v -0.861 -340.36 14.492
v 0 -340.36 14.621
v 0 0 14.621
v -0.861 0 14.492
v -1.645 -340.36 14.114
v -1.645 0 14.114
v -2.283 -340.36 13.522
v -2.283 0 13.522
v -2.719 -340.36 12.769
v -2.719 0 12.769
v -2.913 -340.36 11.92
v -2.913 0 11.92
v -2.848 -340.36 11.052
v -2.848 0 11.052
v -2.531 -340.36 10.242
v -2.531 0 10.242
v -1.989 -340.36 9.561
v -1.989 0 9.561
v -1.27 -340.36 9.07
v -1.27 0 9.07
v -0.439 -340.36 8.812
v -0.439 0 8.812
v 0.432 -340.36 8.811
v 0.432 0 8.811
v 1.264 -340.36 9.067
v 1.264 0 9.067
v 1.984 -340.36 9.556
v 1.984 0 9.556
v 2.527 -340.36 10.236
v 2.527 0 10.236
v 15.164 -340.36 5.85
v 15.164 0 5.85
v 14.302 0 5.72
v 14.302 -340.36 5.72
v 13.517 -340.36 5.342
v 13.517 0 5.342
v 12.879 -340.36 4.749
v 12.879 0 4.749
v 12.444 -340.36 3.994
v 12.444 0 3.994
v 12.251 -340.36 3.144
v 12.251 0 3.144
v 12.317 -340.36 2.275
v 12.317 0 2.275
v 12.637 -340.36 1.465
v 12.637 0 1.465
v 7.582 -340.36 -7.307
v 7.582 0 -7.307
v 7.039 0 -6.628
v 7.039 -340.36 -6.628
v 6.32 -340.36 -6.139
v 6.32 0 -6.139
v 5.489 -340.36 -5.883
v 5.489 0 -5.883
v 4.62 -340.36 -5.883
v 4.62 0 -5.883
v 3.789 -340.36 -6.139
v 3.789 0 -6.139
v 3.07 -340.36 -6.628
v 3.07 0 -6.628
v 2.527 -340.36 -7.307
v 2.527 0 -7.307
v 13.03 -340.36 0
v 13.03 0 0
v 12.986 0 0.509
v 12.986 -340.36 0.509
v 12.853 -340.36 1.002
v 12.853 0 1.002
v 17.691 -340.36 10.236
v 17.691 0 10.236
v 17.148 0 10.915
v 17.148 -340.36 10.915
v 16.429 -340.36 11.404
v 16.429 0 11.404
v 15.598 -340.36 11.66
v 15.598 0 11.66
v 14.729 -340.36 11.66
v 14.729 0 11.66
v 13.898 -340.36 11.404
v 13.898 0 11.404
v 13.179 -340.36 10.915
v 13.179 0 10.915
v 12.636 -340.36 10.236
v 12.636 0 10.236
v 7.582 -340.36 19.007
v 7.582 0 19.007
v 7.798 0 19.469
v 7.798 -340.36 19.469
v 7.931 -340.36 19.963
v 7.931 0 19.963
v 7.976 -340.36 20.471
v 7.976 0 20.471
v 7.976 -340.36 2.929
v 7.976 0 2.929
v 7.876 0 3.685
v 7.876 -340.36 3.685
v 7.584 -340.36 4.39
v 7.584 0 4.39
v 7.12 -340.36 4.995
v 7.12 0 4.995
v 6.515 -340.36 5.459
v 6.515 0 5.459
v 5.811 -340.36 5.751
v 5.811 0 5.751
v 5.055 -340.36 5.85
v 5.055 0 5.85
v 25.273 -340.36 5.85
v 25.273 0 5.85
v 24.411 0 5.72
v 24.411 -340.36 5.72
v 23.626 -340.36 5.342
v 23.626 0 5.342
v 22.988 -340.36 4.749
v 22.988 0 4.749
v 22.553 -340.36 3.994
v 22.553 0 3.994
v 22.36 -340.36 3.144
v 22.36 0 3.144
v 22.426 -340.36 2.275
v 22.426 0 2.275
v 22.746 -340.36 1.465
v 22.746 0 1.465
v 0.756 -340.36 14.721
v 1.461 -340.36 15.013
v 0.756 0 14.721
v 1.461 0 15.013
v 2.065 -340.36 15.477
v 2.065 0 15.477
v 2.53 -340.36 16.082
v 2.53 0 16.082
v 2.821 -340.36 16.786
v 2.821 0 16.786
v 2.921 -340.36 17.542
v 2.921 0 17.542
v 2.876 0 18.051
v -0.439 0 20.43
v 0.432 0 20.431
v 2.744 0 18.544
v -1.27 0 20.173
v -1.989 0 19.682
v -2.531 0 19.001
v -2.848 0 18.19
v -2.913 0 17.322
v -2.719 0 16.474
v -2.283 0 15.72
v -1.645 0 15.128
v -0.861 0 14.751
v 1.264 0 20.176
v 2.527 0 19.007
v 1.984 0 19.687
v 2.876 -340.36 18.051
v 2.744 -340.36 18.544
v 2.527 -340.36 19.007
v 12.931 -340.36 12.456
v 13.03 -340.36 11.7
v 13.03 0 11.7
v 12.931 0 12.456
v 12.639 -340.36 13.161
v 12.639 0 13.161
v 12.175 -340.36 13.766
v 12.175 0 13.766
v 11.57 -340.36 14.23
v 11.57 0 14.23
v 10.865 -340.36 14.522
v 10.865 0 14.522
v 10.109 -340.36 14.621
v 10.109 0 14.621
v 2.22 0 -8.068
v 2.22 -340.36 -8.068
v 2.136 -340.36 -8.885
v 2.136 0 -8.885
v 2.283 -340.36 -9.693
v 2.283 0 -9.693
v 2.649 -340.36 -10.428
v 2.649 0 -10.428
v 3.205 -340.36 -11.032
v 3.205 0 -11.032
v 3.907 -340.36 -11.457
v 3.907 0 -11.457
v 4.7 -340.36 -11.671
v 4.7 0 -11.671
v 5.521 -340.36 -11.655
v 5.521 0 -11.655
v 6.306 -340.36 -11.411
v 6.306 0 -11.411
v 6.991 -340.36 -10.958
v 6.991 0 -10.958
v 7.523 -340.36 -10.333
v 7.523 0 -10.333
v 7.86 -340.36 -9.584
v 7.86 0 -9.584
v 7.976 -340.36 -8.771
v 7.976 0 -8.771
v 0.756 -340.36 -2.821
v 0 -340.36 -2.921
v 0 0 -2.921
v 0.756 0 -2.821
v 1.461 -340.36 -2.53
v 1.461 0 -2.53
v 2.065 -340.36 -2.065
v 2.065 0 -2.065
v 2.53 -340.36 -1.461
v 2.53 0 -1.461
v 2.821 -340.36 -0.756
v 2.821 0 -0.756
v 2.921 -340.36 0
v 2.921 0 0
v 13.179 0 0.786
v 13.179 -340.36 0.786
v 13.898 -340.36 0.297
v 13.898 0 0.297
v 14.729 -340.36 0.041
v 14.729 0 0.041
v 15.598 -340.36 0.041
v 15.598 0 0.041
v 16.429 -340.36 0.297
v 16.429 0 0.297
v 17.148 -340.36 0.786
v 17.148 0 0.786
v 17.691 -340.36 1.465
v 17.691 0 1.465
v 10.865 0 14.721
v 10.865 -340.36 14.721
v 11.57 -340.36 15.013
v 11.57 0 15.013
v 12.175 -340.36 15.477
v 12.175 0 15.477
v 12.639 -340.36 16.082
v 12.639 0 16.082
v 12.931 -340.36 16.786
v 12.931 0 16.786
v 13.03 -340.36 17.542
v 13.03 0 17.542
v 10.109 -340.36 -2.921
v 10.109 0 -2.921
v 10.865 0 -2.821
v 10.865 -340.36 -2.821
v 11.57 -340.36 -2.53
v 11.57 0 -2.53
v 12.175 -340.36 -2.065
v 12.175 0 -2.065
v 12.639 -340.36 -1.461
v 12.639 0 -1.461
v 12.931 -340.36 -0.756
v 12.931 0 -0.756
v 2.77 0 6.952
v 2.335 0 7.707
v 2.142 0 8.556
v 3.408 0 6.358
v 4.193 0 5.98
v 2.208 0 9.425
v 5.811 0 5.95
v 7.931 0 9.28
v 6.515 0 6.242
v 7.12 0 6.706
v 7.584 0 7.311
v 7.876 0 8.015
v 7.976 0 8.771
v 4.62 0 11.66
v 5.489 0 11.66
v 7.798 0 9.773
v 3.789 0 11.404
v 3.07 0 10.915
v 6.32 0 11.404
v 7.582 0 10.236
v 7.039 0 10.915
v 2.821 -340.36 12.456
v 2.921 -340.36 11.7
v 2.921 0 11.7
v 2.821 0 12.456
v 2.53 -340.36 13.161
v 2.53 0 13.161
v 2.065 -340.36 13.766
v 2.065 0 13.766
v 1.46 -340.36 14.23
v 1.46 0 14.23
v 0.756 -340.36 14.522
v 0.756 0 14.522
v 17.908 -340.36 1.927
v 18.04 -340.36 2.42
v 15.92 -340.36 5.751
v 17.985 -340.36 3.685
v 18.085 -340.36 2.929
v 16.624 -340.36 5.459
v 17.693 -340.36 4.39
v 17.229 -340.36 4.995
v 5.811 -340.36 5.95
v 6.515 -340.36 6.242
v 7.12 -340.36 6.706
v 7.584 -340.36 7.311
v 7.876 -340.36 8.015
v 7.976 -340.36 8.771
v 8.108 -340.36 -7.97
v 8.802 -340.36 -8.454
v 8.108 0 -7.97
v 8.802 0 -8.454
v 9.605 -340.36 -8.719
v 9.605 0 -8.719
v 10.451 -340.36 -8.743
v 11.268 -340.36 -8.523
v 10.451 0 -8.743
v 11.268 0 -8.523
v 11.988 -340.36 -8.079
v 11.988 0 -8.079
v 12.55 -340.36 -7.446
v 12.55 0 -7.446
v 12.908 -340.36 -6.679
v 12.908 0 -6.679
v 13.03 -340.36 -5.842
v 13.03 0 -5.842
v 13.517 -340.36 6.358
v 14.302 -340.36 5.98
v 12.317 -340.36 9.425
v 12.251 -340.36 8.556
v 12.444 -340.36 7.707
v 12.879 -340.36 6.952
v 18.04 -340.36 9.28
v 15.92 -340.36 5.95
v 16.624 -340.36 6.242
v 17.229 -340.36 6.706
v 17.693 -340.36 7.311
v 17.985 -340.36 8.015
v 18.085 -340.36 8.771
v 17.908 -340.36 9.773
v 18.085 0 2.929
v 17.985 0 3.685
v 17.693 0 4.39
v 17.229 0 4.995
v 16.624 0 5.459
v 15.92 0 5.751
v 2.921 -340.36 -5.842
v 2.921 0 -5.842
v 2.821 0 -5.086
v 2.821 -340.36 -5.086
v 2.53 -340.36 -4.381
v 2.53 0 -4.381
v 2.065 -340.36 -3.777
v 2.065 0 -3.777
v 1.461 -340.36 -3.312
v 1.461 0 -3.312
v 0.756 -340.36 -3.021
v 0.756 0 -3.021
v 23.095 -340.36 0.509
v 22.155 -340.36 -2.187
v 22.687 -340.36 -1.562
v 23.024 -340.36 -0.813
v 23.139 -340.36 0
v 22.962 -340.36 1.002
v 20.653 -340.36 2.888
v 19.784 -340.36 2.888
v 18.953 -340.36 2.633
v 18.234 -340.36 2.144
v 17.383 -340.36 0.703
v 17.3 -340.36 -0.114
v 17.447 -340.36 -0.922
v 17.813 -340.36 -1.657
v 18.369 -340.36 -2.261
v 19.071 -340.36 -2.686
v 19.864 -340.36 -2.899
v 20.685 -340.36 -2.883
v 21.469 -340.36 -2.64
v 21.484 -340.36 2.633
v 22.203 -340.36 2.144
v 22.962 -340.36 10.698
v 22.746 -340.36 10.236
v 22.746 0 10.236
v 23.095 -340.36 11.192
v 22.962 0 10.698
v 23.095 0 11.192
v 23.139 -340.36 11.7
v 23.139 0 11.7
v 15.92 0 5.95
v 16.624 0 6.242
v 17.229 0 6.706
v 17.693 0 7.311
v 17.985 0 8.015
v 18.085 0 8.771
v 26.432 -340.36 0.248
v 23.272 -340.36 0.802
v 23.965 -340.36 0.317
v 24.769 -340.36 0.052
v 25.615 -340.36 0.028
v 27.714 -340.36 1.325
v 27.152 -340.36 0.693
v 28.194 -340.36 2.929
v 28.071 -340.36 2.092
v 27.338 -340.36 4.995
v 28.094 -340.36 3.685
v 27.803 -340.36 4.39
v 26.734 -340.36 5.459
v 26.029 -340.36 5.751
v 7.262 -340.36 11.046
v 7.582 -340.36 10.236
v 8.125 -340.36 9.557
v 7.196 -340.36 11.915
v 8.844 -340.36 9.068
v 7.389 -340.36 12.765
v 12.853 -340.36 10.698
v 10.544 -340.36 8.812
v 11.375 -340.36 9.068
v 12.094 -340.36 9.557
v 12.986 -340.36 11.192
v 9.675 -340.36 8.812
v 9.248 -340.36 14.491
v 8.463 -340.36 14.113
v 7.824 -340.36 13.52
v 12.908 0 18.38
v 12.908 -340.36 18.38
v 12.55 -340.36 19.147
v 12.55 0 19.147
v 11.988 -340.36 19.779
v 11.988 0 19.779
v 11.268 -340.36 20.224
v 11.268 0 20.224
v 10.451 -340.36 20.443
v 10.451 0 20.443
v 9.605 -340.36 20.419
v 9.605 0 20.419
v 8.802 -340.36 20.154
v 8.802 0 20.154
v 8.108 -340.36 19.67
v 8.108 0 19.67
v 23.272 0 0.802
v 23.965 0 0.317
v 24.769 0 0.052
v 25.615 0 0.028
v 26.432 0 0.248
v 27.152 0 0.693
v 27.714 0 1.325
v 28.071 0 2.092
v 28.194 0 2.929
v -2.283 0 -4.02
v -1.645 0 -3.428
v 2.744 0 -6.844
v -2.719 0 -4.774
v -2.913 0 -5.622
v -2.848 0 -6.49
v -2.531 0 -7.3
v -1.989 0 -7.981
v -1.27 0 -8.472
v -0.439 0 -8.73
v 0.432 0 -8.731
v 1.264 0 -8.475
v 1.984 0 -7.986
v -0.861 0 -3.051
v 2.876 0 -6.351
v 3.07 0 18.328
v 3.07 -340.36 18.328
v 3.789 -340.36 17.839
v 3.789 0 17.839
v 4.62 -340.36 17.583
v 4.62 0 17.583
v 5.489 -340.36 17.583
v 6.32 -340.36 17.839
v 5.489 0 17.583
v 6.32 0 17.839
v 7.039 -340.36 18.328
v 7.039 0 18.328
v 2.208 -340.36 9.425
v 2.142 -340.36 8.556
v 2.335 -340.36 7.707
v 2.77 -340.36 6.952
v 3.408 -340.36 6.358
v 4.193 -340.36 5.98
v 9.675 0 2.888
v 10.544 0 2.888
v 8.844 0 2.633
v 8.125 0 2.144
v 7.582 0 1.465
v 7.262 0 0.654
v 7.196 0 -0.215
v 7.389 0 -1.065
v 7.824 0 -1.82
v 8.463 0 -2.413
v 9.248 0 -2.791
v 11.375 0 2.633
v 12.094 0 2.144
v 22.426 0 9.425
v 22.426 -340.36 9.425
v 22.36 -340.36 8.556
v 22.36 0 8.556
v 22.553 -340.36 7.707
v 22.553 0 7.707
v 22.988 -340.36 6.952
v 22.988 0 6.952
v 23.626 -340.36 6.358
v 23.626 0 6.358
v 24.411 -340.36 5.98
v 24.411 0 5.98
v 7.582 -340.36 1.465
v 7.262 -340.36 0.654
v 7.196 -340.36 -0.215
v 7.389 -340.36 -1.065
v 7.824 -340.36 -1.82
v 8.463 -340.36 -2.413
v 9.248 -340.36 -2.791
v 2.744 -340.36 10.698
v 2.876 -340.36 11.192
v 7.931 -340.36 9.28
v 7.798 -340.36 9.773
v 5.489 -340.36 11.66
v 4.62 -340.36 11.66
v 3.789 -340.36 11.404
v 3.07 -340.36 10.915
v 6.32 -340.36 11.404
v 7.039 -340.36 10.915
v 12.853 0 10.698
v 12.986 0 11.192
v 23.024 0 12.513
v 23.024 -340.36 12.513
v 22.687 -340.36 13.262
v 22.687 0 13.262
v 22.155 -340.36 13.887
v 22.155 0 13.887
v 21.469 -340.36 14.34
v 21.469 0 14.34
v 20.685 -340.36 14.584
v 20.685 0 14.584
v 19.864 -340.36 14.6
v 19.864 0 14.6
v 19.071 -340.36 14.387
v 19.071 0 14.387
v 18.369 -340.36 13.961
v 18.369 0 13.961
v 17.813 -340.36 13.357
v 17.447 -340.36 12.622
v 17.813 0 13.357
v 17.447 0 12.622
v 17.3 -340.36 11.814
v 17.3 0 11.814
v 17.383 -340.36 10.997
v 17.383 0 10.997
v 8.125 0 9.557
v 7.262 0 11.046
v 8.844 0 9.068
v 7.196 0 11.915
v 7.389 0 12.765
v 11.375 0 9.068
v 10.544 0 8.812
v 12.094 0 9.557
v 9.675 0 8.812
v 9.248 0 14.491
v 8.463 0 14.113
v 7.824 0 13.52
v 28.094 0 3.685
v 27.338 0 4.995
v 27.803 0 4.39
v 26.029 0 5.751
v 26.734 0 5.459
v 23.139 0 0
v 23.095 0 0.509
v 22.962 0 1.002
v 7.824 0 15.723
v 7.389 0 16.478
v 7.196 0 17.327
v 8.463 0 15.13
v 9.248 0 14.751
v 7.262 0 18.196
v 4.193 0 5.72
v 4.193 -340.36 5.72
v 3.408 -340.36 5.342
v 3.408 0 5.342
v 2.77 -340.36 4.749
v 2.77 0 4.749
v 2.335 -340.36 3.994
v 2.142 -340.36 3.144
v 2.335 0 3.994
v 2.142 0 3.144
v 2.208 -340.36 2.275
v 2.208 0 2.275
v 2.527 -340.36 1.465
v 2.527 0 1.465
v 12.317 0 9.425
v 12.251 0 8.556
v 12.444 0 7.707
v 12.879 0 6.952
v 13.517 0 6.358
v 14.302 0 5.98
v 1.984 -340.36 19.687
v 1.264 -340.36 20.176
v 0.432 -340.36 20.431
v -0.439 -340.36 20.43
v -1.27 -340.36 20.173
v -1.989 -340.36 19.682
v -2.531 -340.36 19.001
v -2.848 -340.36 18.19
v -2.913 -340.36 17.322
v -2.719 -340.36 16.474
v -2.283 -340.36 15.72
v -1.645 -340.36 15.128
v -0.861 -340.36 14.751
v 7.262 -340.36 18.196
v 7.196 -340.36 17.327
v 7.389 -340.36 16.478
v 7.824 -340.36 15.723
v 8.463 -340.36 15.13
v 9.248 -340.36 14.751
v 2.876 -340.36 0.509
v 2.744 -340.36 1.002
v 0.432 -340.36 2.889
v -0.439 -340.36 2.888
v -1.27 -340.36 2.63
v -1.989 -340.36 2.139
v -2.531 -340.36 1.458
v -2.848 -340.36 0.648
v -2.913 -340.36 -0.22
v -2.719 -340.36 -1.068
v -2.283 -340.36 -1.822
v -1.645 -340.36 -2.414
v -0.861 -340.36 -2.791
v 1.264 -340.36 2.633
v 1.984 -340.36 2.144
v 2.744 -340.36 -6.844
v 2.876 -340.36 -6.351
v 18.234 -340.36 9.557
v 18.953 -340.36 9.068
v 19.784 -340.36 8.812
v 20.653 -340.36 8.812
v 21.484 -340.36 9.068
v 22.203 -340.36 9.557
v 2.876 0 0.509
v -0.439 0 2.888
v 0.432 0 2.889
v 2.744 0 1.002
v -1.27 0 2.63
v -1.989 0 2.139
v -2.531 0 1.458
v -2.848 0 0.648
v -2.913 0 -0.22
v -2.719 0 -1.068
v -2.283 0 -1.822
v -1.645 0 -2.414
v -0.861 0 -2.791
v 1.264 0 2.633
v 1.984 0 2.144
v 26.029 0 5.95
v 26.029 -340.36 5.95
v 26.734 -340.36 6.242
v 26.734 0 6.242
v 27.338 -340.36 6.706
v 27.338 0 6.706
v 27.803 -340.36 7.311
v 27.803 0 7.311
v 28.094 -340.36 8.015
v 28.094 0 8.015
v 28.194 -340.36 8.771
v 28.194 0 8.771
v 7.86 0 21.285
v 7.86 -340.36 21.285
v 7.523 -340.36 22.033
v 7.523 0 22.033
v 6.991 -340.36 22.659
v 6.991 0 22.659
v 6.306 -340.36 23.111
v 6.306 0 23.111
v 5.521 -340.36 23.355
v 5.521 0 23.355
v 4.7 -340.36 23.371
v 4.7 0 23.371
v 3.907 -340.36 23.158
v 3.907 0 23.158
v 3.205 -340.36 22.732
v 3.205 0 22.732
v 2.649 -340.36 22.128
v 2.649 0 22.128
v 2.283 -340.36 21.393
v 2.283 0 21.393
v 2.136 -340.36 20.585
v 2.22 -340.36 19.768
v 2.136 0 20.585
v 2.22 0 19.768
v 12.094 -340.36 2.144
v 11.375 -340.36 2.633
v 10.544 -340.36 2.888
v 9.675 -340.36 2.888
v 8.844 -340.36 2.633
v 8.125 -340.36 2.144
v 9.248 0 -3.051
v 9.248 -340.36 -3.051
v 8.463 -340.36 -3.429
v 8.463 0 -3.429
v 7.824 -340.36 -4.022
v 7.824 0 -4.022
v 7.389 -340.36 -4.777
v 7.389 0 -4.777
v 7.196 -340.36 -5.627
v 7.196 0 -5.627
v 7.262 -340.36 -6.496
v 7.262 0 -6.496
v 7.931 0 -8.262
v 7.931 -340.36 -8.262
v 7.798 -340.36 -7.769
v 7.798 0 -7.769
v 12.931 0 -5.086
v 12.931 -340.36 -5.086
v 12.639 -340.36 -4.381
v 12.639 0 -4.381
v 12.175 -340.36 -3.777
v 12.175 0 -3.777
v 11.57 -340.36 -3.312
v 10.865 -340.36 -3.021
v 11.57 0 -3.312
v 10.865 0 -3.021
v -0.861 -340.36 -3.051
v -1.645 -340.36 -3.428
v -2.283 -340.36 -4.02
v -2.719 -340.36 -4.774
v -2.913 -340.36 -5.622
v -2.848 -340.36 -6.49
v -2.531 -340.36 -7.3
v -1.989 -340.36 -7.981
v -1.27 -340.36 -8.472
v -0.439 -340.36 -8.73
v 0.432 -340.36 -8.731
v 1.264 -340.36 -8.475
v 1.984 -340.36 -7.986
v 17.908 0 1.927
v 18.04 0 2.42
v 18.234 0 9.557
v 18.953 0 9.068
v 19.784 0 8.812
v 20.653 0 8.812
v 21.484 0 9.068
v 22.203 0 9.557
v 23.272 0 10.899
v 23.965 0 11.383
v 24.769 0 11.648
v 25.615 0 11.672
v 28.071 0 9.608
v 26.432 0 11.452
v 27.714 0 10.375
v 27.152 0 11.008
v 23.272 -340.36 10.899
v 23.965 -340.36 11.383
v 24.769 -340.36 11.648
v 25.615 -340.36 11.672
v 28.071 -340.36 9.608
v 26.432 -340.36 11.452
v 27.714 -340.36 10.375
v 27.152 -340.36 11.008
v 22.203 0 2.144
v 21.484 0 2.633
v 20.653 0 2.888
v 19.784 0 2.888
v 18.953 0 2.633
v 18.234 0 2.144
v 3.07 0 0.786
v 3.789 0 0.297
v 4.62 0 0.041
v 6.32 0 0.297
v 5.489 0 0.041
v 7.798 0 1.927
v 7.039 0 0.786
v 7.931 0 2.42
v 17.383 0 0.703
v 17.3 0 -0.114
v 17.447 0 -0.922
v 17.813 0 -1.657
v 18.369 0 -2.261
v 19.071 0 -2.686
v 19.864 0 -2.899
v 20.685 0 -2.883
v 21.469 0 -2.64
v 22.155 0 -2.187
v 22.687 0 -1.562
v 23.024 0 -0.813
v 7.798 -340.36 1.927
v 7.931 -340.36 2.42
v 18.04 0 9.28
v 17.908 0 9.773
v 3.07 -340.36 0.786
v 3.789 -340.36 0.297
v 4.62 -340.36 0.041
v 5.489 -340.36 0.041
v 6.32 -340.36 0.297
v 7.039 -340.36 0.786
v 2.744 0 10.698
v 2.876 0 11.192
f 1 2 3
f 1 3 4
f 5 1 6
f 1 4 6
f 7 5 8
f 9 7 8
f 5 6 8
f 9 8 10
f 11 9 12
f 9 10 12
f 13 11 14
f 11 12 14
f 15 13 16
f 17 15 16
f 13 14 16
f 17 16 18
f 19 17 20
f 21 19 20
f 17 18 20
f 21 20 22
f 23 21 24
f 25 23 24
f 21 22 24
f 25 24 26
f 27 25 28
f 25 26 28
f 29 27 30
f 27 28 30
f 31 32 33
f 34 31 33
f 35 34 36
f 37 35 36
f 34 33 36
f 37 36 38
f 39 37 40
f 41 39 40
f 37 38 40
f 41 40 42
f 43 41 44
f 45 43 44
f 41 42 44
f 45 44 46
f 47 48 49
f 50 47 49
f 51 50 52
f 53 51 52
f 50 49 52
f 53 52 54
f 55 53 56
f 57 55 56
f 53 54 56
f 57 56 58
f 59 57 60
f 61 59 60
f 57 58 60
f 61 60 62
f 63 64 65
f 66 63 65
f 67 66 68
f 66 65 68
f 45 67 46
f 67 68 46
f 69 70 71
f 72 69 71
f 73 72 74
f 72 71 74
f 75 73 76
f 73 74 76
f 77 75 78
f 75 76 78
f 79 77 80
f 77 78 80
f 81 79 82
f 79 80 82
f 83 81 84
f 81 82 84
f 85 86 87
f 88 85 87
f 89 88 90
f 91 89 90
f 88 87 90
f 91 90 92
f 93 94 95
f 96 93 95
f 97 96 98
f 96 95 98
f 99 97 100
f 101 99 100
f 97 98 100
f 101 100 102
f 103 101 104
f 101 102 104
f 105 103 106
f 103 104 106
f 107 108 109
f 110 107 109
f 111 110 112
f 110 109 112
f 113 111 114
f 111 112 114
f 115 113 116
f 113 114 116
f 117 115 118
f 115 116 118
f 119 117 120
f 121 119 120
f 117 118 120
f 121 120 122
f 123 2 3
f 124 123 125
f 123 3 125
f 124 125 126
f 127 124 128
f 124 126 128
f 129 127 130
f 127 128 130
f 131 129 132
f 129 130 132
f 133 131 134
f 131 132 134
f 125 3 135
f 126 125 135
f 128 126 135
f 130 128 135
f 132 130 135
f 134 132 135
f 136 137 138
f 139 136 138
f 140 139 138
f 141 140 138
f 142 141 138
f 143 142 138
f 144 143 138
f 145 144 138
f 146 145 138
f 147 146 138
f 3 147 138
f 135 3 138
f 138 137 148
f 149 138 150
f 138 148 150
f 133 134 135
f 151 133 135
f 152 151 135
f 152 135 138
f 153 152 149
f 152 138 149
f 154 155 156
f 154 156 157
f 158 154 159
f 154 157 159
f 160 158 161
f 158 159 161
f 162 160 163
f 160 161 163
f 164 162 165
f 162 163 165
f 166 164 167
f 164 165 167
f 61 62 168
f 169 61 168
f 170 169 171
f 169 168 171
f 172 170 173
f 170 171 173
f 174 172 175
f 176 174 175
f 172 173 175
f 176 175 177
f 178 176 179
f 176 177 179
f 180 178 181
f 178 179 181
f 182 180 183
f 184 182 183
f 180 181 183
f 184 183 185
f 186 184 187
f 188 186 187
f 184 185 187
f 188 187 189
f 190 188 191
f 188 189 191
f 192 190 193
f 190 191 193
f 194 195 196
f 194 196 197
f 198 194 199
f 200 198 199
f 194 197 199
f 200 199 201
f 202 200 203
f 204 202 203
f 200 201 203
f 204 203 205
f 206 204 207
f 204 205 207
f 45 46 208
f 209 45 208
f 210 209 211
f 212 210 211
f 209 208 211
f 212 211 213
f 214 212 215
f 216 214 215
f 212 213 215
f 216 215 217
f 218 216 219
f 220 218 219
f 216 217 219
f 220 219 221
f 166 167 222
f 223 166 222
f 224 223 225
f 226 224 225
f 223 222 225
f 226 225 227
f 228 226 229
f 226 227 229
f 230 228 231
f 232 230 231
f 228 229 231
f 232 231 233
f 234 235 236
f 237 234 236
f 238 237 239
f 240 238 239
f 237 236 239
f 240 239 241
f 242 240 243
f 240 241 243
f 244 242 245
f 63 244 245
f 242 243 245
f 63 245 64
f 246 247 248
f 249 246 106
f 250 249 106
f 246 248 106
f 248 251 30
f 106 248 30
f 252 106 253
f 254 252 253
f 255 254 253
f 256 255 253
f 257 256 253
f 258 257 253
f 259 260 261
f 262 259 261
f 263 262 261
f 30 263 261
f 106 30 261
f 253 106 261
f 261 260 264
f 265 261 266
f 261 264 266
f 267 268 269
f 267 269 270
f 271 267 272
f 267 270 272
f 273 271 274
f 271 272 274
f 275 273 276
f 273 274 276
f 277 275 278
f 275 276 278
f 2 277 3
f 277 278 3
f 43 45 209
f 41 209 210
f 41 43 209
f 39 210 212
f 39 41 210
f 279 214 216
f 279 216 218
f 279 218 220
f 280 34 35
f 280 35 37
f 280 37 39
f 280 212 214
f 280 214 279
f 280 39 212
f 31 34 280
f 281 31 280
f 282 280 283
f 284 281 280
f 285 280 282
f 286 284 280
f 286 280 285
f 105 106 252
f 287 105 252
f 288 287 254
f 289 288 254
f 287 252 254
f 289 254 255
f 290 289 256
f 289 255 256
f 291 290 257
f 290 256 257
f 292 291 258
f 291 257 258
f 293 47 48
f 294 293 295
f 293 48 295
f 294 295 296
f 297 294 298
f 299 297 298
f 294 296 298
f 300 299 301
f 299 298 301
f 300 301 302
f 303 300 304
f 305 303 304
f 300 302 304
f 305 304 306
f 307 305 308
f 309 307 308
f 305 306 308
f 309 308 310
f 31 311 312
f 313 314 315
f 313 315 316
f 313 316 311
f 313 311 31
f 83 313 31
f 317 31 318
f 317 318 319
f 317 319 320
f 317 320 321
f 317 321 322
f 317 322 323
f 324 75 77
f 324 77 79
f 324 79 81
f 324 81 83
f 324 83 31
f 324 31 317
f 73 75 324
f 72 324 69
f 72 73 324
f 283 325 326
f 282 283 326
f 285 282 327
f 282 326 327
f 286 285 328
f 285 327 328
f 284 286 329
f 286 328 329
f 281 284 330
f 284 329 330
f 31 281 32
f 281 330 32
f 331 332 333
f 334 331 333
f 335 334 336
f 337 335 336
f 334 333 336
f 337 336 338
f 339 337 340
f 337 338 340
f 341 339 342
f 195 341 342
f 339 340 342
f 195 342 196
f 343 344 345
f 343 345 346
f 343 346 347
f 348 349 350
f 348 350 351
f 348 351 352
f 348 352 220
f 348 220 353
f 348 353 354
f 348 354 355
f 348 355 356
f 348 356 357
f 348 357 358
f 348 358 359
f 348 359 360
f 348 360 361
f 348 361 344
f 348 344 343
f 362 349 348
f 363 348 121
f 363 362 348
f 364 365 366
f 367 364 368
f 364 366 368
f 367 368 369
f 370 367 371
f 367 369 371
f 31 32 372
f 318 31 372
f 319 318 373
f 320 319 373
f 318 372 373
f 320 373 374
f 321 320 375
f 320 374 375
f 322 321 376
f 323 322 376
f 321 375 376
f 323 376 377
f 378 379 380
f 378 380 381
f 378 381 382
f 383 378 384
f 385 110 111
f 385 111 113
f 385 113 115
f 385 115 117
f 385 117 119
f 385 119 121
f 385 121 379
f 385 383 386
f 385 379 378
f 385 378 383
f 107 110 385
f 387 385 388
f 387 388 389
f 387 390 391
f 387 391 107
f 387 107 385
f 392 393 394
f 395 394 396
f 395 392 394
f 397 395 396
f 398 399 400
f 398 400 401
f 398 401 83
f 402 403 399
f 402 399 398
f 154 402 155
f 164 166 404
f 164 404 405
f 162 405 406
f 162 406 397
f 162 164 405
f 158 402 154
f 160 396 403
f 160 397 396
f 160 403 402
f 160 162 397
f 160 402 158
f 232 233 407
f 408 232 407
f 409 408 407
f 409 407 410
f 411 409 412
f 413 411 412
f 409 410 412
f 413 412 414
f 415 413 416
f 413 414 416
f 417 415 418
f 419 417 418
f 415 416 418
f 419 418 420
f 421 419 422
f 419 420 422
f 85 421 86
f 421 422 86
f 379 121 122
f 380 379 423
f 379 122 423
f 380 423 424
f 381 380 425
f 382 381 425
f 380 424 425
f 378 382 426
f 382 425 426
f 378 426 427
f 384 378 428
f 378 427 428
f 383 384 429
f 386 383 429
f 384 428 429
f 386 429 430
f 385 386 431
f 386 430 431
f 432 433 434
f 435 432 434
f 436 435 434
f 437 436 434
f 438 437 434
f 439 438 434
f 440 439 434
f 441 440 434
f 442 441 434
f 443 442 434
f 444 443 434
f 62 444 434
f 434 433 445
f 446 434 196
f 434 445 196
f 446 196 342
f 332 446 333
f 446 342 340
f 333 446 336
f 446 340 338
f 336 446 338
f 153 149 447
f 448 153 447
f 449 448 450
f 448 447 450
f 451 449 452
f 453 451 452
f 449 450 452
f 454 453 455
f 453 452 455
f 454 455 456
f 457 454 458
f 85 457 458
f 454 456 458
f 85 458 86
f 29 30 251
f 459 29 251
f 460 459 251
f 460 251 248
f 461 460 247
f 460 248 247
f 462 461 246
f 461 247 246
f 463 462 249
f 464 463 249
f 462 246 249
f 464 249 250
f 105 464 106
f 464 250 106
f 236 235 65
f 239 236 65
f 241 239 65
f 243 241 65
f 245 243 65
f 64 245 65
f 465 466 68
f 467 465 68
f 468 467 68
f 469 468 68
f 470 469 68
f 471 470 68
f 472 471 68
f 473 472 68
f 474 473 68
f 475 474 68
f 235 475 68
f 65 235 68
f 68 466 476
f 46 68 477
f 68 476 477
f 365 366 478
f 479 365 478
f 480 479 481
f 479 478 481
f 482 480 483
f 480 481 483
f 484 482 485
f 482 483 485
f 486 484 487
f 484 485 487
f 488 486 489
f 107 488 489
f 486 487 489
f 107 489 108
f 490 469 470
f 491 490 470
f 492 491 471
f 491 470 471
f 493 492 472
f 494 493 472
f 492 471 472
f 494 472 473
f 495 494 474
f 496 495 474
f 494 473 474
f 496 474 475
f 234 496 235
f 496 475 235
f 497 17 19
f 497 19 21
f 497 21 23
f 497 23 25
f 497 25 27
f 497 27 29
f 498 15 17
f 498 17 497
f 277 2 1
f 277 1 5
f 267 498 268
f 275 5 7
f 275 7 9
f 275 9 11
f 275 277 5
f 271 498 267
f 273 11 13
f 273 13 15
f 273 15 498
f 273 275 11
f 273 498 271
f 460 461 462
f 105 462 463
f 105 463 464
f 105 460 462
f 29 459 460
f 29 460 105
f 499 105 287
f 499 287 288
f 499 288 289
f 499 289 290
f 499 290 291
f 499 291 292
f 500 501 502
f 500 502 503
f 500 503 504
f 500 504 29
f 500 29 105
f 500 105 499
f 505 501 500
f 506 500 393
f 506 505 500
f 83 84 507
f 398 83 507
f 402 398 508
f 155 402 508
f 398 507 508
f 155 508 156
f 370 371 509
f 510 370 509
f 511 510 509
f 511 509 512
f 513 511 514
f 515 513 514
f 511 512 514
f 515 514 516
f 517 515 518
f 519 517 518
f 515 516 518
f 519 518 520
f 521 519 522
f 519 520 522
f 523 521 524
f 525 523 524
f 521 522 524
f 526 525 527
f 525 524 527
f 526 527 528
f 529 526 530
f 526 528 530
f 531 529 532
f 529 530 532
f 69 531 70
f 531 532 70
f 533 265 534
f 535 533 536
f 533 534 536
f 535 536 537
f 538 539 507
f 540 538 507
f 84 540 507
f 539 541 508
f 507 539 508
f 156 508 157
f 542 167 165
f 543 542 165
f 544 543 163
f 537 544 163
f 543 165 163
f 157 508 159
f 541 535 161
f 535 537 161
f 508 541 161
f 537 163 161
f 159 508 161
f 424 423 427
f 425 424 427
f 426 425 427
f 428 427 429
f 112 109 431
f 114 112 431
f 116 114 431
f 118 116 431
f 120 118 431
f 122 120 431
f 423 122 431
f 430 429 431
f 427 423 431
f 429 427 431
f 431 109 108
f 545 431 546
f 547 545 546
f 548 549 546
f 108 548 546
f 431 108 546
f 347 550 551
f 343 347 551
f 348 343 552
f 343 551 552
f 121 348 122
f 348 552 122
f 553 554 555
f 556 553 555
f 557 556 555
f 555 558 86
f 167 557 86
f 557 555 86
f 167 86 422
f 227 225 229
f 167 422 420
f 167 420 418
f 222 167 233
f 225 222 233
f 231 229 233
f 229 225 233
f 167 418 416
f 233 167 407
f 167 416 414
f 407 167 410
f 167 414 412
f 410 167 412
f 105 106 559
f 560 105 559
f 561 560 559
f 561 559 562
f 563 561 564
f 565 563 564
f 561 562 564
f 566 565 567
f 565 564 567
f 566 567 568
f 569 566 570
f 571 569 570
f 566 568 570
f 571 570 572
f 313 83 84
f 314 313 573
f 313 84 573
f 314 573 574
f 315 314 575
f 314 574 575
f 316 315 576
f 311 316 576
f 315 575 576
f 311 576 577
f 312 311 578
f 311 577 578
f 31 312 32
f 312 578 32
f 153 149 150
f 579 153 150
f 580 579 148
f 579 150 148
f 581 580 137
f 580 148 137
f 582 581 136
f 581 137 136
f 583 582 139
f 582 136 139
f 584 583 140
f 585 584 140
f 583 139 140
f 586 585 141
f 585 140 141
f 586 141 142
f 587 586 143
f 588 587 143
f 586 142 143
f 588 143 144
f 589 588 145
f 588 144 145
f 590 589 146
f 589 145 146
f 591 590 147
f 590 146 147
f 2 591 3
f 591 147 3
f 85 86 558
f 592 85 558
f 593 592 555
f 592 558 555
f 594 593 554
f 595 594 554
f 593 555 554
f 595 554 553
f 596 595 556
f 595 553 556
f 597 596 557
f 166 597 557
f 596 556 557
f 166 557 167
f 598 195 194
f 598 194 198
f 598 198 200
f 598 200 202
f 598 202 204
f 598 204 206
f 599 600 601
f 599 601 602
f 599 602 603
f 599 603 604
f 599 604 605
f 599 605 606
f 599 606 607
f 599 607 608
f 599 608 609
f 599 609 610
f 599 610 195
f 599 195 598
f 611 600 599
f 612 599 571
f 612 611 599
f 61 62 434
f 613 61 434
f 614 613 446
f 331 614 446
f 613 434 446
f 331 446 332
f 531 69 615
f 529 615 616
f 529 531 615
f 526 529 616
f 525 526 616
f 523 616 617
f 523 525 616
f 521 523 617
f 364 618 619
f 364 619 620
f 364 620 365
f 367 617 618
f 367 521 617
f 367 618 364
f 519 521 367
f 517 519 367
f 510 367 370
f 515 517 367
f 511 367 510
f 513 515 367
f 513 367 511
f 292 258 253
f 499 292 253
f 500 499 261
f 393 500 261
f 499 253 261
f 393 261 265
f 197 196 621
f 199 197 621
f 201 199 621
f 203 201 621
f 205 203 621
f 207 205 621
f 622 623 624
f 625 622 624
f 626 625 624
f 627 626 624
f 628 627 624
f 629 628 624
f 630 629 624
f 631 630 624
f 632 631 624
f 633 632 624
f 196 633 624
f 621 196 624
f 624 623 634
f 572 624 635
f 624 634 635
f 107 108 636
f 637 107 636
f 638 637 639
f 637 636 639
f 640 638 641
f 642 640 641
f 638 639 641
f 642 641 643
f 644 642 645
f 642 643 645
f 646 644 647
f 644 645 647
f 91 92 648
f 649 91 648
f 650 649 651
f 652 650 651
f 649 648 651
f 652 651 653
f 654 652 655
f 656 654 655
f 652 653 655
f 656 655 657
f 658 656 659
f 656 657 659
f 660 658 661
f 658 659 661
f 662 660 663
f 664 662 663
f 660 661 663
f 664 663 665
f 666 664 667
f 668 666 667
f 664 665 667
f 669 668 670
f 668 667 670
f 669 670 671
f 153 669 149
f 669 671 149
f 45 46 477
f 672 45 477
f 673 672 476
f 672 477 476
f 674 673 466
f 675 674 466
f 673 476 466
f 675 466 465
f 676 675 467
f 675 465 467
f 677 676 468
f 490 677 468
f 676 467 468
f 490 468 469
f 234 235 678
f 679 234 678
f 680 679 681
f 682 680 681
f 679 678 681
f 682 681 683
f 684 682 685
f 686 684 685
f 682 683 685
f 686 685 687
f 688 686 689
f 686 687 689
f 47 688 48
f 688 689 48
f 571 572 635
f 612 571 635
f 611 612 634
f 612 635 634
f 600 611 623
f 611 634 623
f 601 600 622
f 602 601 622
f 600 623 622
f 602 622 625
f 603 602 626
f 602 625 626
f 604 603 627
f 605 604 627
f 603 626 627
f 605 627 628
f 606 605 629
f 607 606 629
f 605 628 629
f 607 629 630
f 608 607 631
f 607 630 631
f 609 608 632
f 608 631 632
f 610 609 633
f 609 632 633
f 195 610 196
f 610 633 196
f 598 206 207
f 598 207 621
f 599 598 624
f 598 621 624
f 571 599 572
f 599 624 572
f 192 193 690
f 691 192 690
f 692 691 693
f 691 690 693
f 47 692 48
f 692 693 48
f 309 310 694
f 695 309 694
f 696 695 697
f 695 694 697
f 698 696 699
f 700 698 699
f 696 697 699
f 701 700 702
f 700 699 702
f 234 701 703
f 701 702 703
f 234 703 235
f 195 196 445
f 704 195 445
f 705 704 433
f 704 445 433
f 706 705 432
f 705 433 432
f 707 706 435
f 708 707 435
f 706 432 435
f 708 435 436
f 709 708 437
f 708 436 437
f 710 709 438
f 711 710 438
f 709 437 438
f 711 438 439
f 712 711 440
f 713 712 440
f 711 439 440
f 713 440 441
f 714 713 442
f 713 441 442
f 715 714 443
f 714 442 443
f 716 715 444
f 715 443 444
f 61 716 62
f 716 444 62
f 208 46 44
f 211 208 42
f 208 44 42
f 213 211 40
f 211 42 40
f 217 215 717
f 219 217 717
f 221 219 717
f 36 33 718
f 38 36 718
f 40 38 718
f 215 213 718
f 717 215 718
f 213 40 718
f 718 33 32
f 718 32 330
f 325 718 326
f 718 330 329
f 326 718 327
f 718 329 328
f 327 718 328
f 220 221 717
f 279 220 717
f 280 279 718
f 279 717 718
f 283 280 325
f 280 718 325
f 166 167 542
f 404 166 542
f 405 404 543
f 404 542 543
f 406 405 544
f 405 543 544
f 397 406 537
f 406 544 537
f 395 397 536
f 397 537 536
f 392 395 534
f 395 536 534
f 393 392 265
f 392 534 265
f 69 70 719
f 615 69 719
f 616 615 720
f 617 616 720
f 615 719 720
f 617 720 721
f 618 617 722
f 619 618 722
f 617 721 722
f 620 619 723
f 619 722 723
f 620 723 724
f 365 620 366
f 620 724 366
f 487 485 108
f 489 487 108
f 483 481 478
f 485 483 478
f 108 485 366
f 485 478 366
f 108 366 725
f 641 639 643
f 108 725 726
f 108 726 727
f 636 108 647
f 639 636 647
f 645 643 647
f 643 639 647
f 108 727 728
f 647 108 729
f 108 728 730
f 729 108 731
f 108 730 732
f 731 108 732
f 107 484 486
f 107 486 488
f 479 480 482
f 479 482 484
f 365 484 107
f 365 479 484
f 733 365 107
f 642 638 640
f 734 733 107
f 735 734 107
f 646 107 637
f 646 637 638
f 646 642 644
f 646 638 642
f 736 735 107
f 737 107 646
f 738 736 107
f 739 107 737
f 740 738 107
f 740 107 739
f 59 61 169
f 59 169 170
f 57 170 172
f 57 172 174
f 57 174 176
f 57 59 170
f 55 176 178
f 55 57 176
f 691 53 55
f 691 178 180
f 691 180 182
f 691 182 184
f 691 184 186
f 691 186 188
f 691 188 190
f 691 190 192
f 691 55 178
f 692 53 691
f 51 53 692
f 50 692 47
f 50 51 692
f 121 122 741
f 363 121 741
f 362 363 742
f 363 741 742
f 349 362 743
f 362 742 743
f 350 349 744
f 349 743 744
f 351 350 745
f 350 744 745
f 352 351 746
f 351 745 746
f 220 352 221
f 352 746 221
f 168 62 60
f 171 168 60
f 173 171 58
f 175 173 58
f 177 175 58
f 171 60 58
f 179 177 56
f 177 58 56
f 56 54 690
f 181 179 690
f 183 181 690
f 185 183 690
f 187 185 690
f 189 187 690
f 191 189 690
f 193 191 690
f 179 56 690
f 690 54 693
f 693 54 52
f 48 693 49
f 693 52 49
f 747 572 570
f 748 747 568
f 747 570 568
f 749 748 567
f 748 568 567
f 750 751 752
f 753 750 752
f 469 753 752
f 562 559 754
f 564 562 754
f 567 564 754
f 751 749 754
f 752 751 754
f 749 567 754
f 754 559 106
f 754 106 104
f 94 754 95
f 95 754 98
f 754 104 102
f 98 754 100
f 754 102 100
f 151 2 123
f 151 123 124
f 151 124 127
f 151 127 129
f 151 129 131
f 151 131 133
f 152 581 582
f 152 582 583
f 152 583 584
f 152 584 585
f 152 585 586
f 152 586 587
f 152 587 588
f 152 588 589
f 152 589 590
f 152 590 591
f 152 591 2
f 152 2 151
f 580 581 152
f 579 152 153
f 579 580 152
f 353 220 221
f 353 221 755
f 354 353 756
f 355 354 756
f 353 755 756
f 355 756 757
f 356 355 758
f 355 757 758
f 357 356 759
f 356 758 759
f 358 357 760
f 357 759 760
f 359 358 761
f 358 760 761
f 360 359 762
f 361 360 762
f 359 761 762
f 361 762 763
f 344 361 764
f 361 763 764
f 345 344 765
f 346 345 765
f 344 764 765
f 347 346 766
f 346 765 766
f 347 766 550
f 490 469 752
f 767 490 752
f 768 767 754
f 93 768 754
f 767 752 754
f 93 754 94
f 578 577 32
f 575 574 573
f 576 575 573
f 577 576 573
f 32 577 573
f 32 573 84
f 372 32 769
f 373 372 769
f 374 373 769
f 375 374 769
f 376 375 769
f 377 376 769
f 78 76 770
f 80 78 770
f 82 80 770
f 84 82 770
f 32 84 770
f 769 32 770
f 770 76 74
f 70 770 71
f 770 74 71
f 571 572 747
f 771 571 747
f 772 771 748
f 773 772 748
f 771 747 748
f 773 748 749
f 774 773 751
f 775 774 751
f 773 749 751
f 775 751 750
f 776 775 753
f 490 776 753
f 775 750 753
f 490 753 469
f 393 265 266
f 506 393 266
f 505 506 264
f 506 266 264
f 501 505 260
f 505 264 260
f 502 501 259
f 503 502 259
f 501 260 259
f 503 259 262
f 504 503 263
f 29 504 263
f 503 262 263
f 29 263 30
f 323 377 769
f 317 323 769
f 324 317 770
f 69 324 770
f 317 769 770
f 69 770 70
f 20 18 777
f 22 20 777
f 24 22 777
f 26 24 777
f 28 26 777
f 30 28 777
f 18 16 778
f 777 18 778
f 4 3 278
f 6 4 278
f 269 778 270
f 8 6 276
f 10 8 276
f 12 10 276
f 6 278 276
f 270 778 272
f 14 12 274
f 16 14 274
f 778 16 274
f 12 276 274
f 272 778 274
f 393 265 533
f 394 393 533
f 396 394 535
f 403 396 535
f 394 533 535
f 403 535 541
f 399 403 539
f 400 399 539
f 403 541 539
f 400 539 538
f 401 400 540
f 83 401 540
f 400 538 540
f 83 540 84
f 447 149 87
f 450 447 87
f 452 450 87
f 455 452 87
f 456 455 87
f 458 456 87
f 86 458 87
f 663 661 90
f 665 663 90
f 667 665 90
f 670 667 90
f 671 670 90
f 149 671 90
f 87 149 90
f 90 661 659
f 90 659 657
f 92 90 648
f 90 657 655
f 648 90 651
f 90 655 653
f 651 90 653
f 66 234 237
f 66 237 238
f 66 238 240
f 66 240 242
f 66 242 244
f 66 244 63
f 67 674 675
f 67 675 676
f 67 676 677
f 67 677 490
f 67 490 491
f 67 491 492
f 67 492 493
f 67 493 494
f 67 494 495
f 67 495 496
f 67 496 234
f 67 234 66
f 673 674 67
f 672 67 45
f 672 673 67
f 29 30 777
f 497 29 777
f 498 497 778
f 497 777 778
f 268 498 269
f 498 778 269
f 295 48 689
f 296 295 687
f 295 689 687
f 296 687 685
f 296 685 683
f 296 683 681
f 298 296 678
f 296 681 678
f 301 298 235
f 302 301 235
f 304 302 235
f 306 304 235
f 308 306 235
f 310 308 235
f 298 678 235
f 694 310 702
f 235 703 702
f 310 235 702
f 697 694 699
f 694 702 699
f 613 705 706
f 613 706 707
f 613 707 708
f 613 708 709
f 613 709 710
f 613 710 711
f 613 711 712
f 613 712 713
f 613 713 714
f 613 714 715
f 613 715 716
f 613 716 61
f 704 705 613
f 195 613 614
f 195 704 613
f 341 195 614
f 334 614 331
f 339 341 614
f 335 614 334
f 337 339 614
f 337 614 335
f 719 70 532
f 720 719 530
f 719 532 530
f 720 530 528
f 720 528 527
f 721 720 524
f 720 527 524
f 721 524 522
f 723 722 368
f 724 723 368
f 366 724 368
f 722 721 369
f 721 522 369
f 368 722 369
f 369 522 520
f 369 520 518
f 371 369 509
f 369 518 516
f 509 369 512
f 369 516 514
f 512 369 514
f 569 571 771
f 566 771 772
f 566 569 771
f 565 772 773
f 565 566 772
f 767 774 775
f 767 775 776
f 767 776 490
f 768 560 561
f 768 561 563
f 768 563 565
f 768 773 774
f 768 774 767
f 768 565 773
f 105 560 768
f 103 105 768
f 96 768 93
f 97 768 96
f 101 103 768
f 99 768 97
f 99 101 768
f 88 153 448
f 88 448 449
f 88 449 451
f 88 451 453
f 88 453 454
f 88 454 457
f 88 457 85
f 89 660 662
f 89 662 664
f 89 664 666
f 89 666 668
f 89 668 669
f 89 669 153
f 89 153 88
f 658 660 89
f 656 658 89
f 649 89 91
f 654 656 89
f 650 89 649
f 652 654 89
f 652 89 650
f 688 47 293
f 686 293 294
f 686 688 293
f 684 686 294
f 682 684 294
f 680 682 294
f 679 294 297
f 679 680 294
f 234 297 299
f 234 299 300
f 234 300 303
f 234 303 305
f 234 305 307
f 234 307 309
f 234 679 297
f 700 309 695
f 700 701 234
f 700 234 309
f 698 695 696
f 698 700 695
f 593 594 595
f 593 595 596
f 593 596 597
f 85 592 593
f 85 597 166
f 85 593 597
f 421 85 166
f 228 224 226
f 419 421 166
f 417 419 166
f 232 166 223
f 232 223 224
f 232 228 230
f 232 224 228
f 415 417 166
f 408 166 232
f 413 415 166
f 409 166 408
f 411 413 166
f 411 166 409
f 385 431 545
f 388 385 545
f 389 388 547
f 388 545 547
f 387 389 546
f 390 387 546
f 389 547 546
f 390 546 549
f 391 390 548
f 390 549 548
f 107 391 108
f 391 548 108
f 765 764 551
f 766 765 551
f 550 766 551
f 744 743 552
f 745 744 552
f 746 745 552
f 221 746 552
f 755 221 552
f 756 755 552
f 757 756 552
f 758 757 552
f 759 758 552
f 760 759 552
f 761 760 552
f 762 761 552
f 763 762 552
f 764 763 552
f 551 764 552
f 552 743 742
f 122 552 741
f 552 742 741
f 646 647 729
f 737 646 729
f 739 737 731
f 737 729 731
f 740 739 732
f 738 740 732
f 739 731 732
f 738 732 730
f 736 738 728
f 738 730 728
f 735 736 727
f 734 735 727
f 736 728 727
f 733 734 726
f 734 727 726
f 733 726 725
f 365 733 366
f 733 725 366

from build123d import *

# Parameters (mm, degrees)
F1_DEPTH = 340.36


with BuildPart() as f1:
    # F0 (on Front) → F1 (new body)
    with BuildSketch(Plane.XZ):
        with BuildLine():
            ThreePointArc((2.5273, 10.235741), (2.523762, 7.312702), (5.0546, 5.850161))
            ThreePointArc((5.0546, 5.850161), (7.120059, 6.705702), (7.9756, 8.771161))
            ThreePointArc((7.9756, 8.771161), (7.875458, 9.529448), (7.5819, 10.235741))
            ThreePointArc((7.5819, 10.235741), (5.0546, 11.692161), (2.5273, 10.235741))
        make_face()
        with BuildLine():
            ThreePointArc((7.5819, -7.30658), (5.0546, -5.850161), (2.5273, -7.30658))
            ThreePointArc((2.5273, -7.30658), (4.296313, -11.592019), (7.9756, -8.771161))
            ThreePointArc((7.9756, -8.771161), (7.875458, -8.012874), (7.5819, -7.30658))
        make_face()
        with BuildLine():
            ThreePointArc((0, -2.921), (2.065459, -2.065459), (2.921, 0))
            ThreePointArc((2.921, 0), (2.820858, 0.758287), (2.5273, 1.46458))
            ThreePointArc((2.5273, 1.46458), (-2.530838, 1.458458), (0, -2.921))
        make_face()
        with BuildLine():
            ThreePointArc((12.6365, 10.235741), (12.632962, 7.312702), (15.1638, 5.850161))
            ThreePointArc((15.1638, 5.850161), (17.229259, 6.705702), (18.0848, 8.771161))
            ThreePointArc((18.0848, 8.771161), (17.984658, 9.529448), (17.6911, 10.235741))
            ThreePointArc((17.6911, 10.235741), (15.1638, 11.692161), (12.6365, 10.235741))
        make_face()
        with BuildLine():
            ThreePointArc((12.6365, 1.46458), (10.1092, 2.921), (7.5819, 1.46458))
            ThreePointArc((7.5819, 1.46458), (7.578362, -1.458458), (10.1092, -2.921))
            ThreePointArc((10.1092, -2.921), (12.174659, -2.065459), (13.0302, 0))
            ThreePointArc((13.0302, 0), (12.930058, 0.758287), (12.6365, 1.46458))
        make_face()
        with BuildLine():
            ThreePointArc((10.1092, 14.621322), (7.578362, 13.15878), (7.5819, 10.235741))
            ThreePointArc((7.5819, 10.235741), (10.1092, 8.779322), (12.6365, 10.235741))
            ThreePointArc((12.6365, 10.235741), (12.930058, 10.942035), (13.0302, 11.700322))
            ThreePointArc((13.0302, 11.700322), (12.174659, 13.76578), (10.1092, 14.621322))
        make_face()
        with BuildLine():
            ThreePointArc((13.0302, -5.842), (12.174659, -3.776541), (10.1092, -2.921))
            ThreePointArc((10.1092, -2.921), (7.578362, -4.383542), (7.5819, -7.30658))
            ThreePointArc((7.5819, -7.30658), (10.867487, -8.662858), (13.0302, -5.842))
        make_face()
        with BuildLine():
            ThreePointArc((2.921, -5.842), (2.065459, -3.776541), (0, -2.921))
            ThreePointArc((0, -2.921), (-2.530838, -7.300458), (2.5273, -7.30658))
            ThreePointArc((2.5273, -7.30658), (2.820858, -6.600287), (2.921, -5.842))
        make_face()
        with BuildLine():
            ThreePointArc((2.5273, 19.006902), (-2.530838, 19.00078), (0, 14.621322))
            ThreePointArc((0, 14.621322), (2.065459, 15.476863), (2.921, 17.542322))
            ThreePointArc((2.921, 17.542322), (2.820858, 18.300608), (2.5273, 19.006902))
        make_face()
        with BuildLine():
            ThreePointArc((15.1638, 5.850161), (12.632962, 4.387619), (12.6365, 1.46458))
            ThreePointArc((12.6365, 1.46458), (15.1638, 0.008161), (17.6911, 1.46458))
            ThreePointArc((17.6911, 1.46458), (17.984658, 2.170874), (18.0848, 2.929161))
            ThreePointArc((18.0848, 2.929161), (17.229259, 4.99462), (15.1638, 5.850161))
        make_face()
        with BuildLine():
            ThreePointArc((7.9756, 20.471482), (4.296313, 23.292341), (2.5273, 19.006902))
            ThreePointArc((2.5273, 19.006902), (5.0546, 17.550482), (7.5819, 19.006902))
            ThreePointArc((7.5819, 19.006902), (7.875458, 19.713196), (7.9756, 20.471482))
        make_face()
        with BuildLine():
            ThreePointArc((22.7457, 10.235741), (22.742162, 7.312702), (25.273, 5.850161))
            ThreePointArc((25.273, 5.850161), (27.338459, 6.705702), (28.194, 8.771161))
            ThreePointArc((28.194, 8.771161), (26.031287, 11.592019), (22.7457, 10.235741))
        make_face()
        with BuildLine():
            ThreePointArc((7.5819, 19.006902), (7.578362, 16.083863), (10.1092, 14.621322))
            ThreePointArc((10.1092, 14.621322), (12.174659, 15.476863), (13.0302, 17.542322))
            ThreePointArc((13.0302, 17.542322), (10.867487, 20.36318), (7.5819, 19.006902))
        make_face()
        with BuildLine():
            ThreePointArc((23.1394, 11.700322), (19.460113, 14.52118), (17.6911, 10.235741))
            ThreePointArc((17.6911, 10.235741), (20.2184, 8.779322), (22.7457, 10.235741))
            ThreePointArc((22.7457, 10.235741), (23.039258, 10.942035), (23.1394, 11.700322))
        make_face()
        with BuildLine():
            ThreePointArc((0, 14.621322), (-2.530838, 10.241863), (2.5273, 10.235741))
            ThreePointArc((2.5273, 10.235741), (2.820858, 10.942035), (2.921, 11.700322))
            ThreePointArc((2.921, 11.700322), (2.065459, 13.76578), (0, 14.621322))
        make_face()
        with BuildLine():
            ThreePointArc((22.7457, 1.46458), (20.2184, 2.921), (17.6911, 1.46458))
            ThreePointArc((17.6911, 1.46458), (19.460113, -2.820858), (23.1394, 0))
            ThreePointArc((23.1394, 0), (23.039258, 0.758287), (22.7457, 1.46458))
        make_face()
        with BuildLine():
            ThreePointArc((25.273, 5.850161), (22.742162, 4.387619), (22.7457, 1.46458))
            ThreePointArc((22.7457, 1.46458), (26.031287, 0.108302), (28.194, 2.929161))
            ThreePointArc((28.194, 2.929161), (27.338459, 4.99462), (25.273, 5.850161))
        make_face()
        with BuildLine():
            ThreePointArc((5.0546, 5.850161), (2.523762, 4.387619), (2.5273, 1.46458))
            ThreePointArc((2.5273, 1.46458), (5.0546, 0.008161), (7.5819, 1.46458))
            ThreePointArc((7.5819, 1.46458), (7.875458, 2.170874), (7.9756, 2.929161))
            ThreePointArc((7.9756, 2.929161), (7.120059, 4.99462), (5.0546, 5.850161))
        make_face()
    extrude(amount=F1_DEPTH)


solid = f1.part
